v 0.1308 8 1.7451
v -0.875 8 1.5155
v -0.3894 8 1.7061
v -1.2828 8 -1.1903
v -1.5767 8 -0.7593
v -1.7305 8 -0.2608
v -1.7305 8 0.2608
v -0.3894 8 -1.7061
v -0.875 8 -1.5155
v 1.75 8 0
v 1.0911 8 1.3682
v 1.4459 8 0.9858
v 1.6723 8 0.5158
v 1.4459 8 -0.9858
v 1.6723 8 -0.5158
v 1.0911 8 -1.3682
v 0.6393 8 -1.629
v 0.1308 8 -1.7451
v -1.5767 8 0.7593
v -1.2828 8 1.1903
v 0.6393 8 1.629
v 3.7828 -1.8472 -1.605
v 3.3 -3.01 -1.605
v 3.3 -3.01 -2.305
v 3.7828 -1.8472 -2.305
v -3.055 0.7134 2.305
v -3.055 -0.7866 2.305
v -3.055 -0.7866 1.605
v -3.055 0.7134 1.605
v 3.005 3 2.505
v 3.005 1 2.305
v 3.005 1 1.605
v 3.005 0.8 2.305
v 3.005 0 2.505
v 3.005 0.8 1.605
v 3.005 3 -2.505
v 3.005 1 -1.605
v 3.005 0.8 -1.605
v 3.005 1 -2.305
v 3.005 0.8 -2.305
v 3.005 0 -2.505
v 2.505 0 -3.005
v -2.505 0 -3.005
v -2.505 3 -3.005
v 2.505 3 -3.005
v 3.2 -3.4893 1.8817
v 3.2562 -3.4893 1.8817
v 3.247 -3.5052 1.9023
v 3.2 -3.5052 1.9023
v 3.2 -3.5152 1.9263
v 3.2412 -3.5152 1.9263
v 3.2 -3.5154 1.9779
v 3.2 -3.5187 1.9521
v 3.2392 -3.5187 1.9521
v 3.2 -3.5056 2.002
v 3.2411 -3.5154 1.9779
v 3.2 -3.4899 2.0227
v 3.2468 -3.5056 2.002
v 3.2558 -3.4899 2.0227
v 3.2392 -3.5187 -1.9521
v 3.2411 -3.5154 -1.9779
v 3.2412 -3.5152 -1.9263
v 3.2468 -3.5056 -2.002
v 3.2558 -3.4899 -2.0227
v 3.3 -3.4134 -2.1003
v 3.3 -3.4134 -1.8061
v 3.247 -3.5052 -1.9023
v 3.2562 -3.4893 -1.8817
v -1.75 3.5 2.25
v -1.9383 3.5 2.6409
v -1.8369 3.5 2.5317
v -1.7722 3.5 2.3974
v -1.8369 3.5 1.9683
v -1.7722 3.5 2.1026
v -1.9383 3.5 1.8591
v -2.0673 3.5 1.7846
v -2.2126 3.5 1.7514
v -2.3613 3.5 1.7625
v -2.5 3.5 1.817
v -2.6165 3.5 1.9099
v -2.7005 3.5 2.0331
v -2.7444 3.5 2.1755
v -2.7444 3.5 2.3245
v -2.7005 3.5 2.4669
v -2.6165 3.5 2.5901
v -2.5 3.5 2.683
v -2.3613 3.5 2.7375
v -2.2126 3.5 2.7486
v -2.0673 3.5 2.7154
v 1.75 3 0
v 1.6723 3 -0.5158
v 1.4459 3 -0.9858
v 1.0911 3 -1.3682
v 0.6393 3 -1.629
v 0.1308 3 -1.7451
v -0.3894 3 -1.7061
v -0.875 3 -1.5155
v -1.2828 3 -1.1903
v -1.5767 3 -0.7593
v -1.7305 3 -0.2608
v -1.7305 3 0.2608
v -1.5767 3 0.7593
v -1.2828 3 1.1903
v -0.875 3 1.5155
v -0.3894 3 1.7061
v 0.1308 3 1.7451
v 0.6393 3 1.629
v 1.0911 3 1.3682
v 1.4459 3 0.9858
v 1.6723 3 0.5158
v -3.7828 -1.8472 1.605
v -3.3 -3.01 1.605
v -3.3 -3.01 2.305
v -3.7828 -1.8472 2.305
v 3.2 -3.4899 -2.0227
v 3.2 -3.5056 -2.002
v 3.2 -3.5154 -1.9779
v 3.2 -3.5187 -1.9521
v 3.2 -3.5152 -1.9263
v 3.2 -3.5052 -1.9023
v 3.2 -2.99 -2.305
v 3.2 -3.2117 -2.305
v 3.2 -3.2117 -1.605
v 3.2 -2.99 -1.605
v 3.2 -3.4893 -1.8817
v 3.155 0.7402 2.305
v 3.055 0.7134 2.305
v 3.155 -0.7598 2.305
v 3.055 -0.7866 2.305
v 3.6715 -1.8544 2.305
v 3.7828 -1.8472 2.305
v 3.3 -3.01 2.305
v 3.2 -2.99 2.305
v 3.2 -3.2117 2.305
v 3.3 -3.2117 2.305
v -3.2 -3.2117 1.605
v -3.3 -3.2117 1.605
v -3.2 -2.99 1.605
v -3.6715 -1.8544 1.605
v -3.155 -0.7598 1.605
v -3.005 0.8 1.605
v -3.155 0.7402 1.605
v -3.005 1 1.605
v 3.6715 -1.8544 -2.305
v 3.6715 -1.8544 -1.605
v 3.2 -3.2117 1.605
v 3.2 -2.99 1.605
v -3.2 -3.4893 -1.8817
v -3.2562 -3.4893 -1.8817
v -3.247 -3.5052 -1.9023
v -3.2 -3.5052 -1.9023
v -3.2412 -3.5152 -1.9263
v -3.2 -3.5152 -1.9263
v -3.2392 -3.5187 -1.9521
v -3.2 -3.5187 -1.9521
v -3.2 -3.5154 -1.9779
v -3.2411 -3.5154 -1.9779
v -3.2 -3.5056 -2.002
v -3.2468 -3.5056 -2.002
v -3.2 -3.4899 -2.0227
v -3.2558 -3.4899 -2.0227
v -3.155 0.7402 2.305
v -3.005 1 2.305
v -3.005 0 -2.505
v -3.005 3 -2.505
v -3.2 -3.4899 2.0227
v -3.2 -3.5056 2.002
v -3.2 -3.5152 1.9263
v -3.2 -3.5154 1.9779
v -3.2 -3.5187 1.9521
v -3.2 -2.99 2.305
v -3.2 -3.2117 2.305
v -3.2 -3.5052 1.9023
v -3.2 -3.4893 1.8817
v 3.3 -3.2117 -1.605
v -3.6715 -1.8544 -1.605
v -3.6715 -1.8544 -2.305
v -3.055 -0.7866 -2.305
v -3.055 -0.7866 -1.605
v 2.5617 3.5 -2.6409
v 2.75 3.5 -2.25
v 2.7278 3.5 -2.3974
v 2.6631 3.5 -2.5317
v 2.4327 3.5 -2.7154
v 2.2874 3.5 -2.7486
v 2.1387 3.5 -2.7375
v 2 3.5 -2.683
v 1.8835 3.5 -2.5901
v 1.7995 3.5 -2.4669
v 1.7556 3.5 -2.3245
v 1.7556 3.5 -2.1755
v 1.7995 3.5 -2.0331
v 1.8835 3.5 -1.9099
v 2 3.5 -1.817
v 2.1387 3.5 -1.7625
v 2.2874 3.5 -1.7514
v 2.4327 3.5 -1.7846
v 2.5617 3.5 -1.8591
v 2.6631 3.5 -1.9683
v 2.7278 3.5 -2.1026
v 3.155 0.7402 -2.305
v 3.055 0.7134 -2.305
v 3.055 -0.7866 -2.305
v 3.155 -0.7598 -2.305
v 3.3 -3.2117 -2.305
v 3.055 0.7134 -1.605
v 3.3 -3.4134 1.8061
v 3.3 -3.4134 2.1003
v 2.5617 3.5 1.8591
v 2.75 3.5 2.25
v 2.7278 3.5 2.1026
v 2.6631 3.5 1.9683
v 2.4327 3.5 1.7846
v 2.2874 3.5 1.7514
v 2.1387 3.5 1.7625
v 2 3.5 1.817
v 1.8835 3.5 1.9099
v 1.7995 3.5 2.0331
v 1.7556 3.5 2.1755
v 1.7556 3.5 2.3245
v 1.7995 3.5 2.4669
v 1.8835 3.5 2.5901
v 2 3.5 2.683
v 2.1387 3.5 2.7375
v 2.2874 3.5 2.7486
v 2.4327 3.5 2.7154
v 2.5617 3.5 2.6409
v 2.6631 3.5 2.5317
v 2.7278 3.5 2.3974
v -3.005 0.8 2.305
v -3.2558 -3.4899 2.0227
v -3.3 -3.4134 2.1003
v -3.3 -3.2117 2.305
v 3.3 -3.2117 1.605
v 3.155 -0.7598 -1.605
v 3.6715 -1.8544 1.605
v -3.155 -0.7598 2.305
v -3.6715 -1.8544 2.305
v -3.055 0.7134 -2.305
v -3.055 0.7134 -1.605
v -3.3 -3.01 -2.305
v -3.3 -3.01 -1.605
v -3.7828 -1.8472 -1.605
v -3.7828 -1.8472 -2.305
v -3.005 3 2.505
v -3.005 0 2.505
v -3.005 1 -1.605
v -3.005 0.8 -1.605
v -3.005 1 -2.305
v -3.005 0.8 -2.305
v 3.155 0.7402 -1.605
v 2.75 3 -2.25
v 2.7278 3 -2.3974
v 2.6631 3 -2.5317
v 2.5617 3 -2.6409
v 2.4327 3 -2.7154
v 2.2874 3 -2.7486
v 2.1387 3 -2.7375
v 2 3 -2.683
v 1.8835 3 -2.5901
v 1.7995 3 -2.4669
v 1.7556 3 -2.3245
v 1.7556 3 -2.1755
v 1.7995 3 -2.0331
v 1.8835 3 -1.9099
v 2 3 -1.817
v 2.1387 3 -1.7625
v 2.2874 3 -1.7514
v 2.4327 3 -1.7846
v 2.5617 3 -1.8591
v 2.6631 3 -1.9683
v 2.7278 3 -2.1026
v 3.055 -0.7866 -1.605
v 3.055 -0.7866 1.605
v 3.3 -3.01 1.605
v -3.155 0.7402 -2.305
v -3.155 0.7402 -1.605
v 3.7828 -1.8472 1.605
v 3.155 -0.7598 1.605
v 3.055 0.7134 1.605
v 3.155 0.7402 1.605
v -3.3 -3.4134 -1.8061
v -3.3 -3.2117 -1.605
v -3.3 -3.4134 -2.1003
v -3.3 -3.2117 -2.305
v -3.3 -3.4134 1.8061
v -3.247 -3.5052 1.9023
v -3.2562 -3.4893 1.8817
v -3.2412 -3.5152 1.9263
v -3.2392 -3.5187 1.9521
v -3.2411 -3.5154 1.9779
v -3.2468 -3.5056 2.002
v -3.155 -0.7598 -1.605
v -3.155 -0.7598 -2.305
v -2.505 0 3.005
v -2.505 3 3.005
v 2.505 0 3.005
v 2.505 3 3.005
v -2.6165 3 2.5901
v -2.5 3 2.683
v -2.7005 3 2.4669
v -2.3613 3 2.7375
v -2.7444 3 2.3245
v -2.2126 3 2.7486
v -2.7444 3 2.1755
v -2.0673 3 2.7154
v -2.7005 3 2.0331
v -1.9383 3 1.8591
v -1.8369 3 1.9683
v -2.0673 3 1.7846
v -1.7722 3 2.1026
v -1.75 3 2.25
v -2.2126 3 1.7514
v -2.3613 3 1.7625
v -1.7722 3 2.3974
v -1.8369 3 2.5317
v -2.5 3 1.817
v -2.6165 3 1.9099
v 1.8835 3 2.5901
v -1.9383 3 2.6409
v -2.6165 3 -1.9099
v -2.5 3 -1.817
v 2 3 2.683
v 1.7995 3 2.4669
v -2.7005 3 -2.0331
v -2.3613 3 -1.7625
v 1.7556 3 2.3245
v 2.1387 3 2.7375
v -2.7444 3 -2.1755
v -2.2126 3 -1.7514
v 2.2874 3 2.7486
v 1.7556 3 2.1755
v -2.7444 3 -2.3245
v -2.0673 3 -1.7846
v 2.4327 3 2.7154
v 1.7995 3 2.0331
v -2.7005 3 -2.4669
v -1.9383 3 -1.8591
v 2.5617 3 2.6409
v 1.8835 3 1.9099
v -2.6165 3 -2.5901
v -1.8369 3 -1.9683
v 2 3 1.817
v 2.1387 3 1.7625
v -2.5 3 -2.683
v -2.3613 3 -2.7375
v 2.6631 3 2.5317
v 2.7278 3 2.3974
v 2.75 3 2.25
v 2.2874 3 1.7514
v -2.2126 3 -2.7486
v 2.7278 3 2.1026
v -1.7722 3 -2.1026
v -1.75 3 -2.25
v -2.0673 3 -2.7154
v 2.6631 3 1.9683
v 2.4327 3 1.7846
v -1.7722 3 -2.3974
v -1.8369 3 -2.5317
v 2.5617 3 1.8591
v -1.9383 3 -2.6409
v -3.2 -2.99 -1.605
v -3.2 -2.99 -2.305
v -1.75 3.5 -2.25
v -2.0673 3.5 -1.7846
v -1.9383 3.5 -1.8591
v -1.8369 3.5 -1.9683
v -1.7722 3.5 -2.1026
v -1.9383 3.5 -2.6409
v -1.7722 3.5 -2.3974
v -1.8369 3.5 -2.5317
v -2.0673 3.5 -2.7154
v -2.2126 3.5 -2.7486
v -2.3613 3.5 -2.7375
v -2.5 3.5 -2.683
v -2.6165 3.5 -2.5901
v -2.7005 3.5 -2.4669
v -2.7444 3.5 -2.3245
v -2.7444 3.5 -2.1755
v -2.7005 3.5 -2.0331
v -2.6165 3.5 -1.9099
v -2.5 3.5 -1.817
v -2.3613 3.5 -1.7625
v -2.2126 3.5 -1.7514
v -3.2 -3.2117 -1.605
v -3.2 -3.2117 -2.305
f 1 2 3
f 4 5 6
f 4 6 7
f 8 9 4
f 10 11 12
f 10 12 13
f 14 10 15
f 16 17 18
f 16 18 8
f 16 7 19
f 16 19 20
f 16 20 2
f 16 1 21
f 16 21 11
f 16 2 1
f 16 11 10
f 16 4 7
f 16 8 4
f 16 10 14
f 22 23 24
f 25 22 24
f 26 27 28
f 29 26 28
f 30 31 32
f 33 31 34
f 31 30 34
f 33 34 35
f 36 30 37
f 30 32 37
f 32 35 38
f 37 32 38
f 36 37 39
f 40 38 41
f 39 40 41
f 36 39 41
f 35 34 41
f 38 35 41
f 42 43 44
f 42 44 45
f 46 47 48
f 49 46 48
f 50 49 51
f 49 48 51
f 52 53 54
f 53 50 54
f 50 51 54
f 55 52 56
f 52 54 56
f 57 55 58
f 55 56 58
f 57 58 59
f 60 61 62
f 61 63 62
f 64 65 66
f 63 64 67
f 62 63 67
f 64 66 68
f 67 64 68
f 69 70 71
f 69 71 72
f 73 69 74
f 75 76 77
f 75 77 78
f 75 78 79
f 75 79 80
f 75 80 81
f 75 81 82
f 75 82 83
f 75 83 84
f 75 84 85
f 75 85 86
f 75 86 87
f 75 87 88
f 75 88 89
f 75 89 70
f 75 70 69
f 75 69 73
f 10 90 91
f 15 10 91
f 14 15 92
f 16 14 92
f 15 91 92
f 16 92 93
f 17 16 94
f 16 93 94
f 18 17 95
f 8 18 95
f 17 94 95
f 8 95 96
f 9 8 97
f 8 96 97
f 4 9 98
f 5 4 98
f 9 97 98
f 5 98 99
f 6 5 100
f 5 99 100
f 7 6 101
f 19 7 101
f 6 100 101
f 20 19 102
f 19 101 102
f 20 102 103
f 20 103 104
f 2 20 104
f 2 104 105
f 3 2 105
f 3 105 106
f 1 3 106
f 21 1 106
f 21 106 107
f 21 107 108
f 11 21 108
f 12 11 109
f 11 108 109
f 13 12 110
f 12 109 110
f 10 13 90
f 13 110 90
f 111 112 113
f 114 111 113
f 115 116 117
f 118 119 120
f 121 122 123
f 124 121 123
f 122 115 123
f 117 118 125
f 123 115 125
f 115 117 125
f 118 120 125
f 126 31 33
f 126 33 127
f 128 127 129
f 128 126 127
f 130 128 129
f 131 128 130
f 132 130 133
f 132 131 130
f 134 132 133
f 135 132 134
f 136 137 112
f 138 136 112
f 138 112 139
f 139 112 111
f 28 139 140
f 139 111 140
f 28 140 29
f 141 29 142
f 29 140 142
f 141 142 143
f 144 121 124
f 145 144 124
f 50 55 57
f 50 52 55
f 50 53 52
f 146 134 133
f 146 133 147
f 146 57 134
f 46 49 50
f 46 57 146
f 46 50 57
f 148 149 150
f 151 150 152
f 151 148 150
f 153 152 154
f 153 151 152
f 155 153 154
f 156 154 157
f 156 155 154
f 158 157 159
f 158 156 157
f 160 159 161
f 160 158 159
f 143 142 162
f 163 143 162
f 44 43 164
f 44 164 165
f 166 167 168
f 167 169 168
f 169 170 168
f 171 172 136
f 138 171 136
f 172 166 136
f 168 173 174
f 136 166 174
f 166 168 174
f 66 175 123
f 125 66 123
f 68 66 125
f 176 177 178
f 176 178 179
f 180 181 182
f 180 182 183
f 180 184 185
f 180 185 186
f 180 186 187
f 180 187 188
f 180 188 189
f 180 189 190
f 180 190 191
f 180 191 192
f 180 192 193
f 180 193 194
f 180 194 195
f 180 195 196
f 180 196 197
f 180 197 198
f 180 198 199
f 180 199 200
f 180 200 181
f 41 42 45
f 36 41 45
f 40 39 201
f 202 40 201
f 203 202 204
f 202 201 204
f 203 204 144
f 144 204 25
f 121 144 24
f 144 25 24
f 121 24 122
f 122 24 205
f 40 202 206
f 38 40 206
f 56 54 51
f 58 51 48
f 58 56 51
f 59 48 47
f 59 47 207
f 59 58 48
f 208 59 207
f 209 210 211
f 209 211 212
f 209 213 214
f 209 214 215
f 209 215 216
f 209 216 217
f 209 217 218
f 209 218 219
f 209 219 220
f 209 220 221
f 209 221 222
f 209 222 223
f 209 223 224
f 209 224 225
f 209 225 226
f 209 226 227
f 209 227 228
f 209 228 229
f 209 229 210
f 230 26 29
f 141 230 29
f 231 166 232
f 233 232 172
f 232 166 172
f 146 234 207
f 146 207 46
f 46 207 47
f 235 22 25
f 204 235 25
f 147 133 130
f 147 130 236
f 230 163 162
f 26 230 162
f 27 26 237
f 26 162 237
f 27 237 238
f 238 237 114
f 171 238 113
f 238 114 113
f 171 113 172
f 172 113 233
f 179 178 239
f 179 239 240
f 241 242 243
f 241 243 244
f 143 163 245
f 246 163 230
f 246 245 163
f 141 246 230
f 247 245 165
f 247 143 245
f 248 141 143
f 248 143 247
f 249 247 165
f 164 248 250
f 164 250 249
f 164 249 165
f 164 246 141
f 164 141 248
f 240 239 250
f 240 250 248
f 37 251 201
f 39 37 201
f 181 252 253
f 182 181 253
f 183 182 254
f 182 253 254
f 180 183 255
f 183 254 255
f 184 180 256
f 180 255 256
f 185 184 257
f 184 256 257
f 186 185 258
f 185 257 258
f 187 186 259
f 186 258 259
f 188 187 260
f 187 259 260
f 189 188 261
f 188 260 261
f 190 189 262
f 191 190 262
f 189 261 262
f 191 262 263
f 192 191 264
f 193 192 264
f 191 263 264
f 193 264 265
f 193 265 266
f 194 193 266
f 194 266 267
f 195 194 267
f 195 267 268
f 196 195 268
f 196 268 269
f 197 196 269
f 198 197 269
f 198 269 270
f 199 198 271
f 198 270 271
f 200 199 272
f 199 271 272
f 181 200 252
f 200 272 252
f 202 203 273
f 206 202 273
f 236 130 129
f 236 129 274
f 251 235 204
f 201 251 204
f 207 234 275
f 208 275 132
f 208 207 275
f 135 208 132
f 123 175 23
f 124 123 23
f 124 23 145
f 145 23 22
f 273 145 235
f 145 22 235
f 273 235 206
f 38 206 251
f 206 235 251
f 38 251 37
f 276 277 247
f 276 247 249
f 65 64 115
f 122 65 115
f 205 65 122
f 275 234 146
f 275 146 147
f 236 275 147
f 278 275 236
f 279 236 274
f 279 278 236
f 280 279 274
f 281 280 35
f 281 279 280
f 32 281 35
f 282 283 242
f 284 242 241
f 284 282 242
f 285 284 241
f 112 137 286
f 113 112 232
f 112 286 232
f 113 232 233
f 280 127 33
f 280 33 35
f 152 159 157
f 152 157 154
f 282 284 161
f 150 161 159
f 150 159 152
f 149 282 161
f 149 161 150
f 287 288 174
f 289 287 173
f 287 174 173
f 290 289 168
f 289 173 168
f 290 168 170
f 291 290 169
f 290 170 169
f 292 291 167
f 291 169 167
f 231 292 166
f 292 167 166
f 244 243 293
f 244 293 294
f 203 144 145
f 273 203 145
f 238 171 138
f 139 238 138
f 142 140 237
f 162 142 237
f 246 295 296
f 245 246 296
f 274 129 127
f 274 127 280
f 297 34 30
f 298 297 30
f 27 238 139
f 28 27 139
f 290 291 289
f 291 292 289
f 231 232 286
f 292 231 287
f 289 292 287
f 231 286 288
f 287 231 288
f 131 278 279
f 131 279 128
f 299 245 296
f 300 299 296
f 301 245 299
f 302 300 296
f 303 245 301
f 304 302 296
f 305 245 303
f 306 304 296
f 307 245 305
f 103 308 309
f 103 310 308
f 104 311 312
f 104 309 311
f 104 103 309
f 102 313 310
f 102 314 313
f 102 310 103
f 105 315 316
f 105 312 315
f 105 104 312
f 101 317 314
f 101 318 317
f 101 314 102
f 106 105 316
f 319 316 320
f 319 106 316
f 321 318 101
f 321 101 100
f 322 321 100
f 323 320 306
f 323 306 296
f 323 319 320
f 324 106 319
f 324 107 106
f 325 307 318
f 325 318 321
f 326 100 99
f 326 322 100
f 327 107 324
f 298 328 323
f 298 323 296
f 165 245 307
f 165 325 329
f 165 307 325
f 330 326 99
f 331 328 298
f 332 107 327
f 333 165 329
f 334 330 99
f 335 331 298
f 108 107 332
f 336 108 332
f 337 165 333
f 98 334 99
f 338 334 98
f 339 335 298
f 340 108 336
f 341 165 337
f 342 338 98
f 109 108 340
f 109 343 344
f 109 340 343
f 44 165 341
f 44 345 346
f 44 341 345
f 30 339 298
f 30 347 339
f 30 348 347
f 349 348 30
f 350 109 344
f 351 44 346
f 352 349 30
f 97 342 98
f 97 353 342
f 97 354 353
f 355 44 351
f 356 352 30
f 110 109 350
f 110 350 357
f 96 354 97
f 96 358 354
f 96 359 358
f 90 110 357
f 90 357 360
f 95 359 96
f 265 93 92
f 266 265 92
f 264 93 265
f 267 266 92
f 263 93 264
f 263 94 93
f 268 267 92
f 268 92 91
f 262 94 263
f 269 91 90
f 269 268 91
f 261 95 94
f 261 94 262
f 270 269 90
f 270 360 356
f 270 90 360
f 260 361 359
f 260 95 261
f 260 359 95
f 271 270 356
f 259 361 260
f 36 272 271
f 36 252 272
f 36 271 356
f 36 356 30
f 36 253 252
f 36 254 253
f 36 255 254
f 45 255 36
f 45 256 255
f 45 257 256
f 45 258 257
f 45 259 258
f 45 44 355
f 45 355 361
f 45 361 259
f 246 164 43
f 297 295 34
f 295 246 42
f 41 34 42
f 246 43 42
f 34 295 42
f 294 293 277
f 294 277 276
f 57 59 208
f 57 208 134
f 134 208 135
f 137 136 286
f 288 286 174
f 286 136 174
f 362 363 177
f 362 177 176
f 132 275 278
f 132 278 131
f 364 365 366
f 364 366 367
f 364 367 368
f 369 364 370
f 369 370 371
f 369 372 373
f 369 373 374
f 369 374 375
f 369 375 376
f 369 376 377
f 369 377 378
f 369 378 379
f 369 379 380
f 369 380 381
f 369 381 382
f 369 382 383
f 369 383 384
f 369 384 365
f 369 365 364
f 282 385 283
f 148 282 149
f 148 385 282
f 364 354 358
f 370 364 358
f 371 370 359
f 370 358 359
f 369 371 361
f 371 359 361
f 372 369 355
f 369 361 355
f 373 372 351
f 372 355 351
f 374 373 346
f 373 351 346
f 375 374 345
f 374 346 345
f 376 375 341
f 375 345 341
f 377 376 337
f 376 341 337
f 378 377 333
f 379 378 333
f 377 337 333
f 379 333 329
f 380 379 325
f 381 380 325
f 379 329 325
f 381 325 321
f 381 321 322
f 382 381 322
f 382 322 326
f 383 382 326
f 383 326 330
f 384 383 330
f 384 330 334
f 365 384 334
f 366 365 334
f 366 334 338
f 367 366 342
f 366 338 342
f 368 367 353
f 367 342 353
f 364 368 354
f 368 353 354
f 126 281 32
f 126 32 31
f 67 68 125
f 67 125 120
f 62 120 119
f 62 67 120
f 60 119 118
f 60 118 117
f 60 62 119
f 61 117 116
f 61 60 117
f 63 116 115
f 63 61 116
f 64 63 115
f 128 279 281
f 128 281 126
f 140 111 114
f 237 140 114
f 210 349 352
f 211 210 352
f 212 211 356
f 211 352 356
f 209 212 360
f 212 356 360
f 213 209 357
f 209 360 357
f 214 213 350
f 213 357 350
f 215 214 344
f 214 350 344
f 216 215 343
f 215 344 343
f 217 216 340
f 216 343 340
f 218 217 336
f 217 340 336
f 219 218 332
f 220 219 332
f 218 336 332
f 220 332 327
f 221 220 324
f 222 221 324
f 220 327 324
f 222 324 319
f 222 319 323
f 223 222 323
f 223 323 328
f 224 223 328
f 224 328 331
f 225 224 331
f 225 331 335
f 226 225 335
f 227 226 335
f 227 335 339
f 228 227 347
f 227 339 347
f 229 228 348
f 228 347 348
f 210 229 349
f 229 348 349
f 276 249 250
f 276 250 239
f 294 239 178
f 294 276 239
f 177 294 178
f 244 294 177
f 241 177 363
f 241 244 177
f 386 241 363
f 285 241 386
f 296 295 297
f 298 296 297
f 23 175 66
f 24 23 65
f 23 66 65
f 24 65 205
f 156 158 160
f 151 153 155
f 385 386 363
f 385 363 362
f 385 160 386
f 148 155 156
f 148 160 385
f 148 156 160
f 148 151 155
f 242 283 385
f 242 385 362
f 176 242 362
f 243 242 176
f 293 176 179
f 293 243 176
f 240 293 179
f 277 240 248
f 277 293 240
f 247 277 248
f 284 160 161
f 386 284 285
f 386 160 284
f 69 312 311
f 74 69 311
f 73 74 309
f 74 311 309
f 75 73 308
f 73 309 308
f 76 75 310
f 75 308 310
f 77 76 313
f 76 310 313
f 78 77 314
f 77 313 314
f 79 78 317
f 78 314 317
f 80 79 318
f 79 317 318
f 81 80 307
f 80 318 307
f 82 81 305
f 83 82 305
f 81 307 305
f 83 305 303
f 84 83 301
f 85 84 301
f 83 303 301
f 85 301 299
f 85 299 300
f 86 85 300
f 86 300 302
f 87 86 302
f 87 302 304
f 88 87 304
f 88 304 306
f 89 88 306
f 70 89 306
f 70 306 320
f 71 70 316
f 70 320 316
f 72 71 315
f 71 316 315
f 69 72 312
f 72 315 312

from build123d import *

# Parameters (mm, degrees)
SKETCH1_W               = 6.01
SKETCH1_H               = 6.01
BOSS_EXTRUDE1_DEPTH     = 3
CHAMFER1_SIZE           = 0.5
SKETCH3_R               = 1.75
BOSS_EXTRUDE2_DEPTH     = 5
SKETCH4_R               = 0.5
BOSS_EXTRUDE6_DEPTH     = 0.5
SKETCH5_R               = 0.5
BOSS_EXTRUDE7_DEPTH     = 0.5
SKETCH6_W               = 0.7
SKETCH6_H               = 0.2
MIRROR2_COPY_1_SKETCH_W = 0.7
MIRROR2_COPY_1_SKETCH_H = 0.2
CUT_EXTRUDE1_DEPTH      = 4.782799277


with BuildPart() as part:
    # Sketch1 → Boss-Extrude1 (new body)
    with BuildSketch(Plane(origin=(0, 0, 0), x_dir=(1, 0, 0), z_dir=(0, 1, 0))):
        Rectangle(SKETCH1_W, SKETCH1_H)
    extrude(amount=BOSS_EXTRUDE1_DEPTH)

    # Chamfer1
    chamfer1_edges = [part.edges().sort_by_distance(p)[0] for p in [
        (3.005, 1.5, 3.005),
        (-3.005, 1.5, 3.005),
        (-3.005, 1.5, -3.005),
        (3.005, 1.5, -3.005),
    ]]
    chamfer(chamfer1_edges, length=CHAMFER1_SIZE)

    # Sketch3 → Boss-Extrude2 (add)
    with BuildSketch(Plane(origin=(0, 3, 0), x_dir=(1, 0, 0), z_dir=(0, 1, 0))):
        Circle(SKETCH3_R)
    extrude(amount=BOSS_EXTRUDE2_DEPTH)

    # Sketch4 → Boss-Extrude6 (add)
    with BuildSketch(Plane(origin=(0, 3, 0), x_dir=(1, 0, 0), z_dir=(0, 1, 0))):
        with Locations((2.25, 2.25)):
            Circle(SKETCH4_R)
        with Locations((2.25, -2.25)):
            Circle(SKETCH4_R)
        with Locations((-2.25, 2.25)):
            Circle(SKETCH4_R)
    extrude(amount=BOSS_EXTRUDE6_DEPTH)

    # Sketch5 → Boss-Extrude7 (add)
    with BuildSketch(Plane(origin=(0, 3, 0), x_dir=(1, 0, 0), z_dir=(0, 1, 0))):
        with Locations((-2.25, -2.25)):
            Circle(SKETCH5_R)
    extrude(amount=BOSS_EXTRUDE7_DEPTH)

    # Sweep1: sweep along a path in Sketch7
    with BuildLine(Plane.XY) as sweep1_path:
        Line((-3.005, 0.9), (-3.105, 0.726794919))
        Line((-3.105, 0.726794919), (-3.105, -0.773205081))
        Line((-3.105, -0.773205081), (-3.72715614, -1.850811126))
        Line((-3.72715614, -1.850811126), (-3.25, -3))
        Line((-3.25, -3), (-3.25, -3.5))
    # Sketch6 → Sweep1 (sweep)
    with BuildSketch(Plane.ZY.offset(3.005)):
        with Locations((-1.955, 0.9)):
            Rectangle(SKETCH6_W, SKETCH6_H)
    sweep1 = sweep(path=sweep1_path.line, transition=Transition.RIGHT)

    # Mirror1: Sweep1 across plane
    add(sweep1.mirror(Plane.XY))

    # Mirror2: Sweep1 across plane
    add(sweep1.mirror(Plane(origin=(0, 0, 0), x_dir=(0, 0, 1), z_dir=(1, 0, 0))))

    # Mirror2 copy 1: sweep along a path in Mirror2 copy 1 path
    with BuildLine(Plane(origin=(0, 0, 0), x_dir=(-1, 0, 0), z_dir=(0, 0, -1))) as mirror2_copy_1_path:
        Line((-3.005, 0.9), (-3.105, 0.726794919))
        Line((-3.105, 0.726794919), (-3.105, -0.773205081))
        Line((-3.105, -0.773205081), (-3.72715614, -1.850811126))
        Line((-3.72715614, -1.850811126), (-3.25, -3))
        Line((-3.25, -3), (-3.25, -3.5))
    # Mirror2 copy 1 sketch → Mirror2 copy 1 (sweep)
    with BuildSketch(Plane(origin=(3.005, 0, 0), x_dir=(0, 0, -1), z_dir=(1, 0, 0))):
        with Locations((-1.955, 0.9)):
            Rectangle(MIRROR2_COPY_1_SKETCH_W, MIRROR2_COPY_1_SKETCH_H)
    sweep(path=mirror2_copy_1_path.line, transition=Transition.RIGHT)

    # Sketch8 → Cut-Extrude1 (cut, symmetric)
    with BuildSketch(Plane(origin=(0, 0, 0), x_dir=(0, 0, -1), z_dir=(1, 0, 0))):
        with BuildLine():
            Line((-2.305, -3.211682602), (-2.305, -3.58660254))
            Line((-2.305, -3.58660254), (-1.605, -3.58660254))
            Line((-1.605, -3.58660254), (-1.605, -3.211682602))
            Line((-1.605, -3.211682602), (-1.881694927, -3.48928466))
            ThreePointArc((-1.881694927, -3.48928466), (-1.952077784, -3.518688814), (-2.022718654, -3.489910032))
            Line((-2.022718654, -3.489910032), (-2.305, -3.211682602))
        make_face()
    cut_extrude1 = extrude(amount=CUT_EXTRUDE1_DEPTH, both=True, mode=Mode.SUBTRACT)

    # Mirror3: Cut-Extrude1 across plane
    add(cut_extrude1.mirror(Plane.XY), mode=Mode.SUBTRACT)


solid = part.part
